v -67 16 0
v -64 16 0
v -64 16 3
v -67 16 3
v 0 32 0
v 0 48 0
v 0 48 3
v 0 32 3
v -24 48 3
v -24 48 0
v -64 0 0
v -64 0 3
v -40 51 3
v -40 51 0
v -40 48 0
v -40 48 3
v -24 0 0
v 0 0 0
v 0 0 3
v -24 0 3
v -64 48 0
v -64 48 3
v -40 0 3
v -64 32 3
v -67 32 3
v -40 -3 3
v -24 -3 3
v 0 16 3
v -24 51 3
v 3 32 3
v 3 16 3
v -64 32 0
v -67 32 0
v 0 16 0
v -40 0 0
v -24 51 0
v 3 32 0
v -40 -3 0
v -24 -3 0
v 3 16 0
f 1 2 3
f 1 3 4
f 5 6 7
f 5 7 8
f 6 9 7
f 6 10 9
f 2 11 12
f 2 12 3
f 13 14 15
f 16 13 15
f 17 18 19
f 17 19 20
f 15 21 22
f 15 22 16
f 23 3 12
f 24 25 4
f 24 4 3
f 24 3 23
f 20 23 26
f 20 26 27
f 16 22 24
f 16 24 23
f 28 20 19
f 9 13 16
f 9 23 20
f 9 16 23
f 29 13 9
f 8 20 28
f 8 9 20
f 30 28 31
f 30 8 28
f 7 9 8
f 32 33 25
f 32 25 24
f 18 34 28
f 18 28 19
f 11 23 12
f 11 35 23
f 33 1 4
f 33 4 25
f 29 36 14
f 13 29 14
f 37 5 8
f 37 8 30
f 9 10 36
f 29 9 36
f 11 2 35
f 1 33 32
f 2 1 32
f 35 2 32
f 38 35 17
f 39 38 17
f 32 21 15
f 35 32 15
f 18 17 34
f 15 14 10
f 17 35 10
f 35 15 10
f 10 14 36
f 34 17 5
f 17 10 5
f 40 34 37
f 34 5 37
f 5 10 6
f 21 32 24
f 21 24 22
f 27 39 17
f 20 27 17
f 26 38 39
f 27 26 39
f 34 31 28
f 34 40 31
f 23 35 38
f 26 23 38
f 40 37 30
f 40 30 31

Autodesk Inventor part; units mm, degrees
ref_plane "YZ Plane" through (0, 0, 0) normal (1, 0, 0) x (0, 1, 0)
ref_plane "XZ Plane" through (0, 0, 0) normal (0, 1, 0) x (-1, 0, 0)
ref_plane "XY Plane" through (0, 0, 0) normal (0, 0, 1) x (1, 0, 0)
sketch "Sketch1" plane through (0, 0, 0) normal (0, 0, 1) x (1, 0, 0)
  line L0 (-24, 48) -> (-24, 51)
  line L1 (-24, 51) -> (-40, 51)
  line L2 (-40, 51) -> (-40, 48)
  line L3 (0, 32) -> (3, 32)
  line L4 (3, 32) -> (3, 16)
  line L5 (3, 16) -> (0, 16)
  line L6 (-40, 0) -> (-40, -3)
  line L7 (-40, -3) -> (-24, -3)
  line L8 (-24, -3) -> (-24, 0)
  line L9 (-64, 16) -> (-67, 16)
  line L10 (-67, 16) -> (-67, 32)
  line L11 (-67, 32) -> (-64, 32)
  line L12 (-64, 48) -> (-40, 48)
  line L13 (-24, 48) -> (0, 48)
  line L14 (-64, 0) -> (-64, 16)
  line L15 (-64, 32) -> (-64, 48)
  line L16 (0, 0) -> (-24, 0)
  line L17 (-40, 0) -> (-64, 0)
  line L18 (0, 48) -> (0, 32)
  line L19 (0, 16) -> (0, 0)
  point P0 (0, 0)
  dimension "d3" = 16
  dimension "d4" = 16
  dimension "d8" = 64
  dimension "d9" = 48
  dimension "d10" = 3
  dimension "d11" = 3
  dimension "d12" = 24
  dimension "d13" = 24
  dimension "d14" = 16
  dimension "d15" = 3
extrude "Plate1" add sketch "Sketch1" along normal blind 3
equation "\"d16\" = Thickness"
equation "\"BendRadius\" = Thickness"
equation "\"BendReliefWidth\" = Thickness"
equation "\"BendReliefDepth\" = 0.5 * Thickness"
equation "\"CornerReliefSize\" = 4 * Thickness"
equation "\"MinimumRemnant\" = 2 * Thickness"
equation "\"TransitionRadius\" = BendRadius"
equation "\"JacobiRadiusSize\" = BendRadius"
equation "\"GapSize\" = Thickness"
equation "\"Thickness\" = 3"
properties part number "front plate" material "Hardboard"
